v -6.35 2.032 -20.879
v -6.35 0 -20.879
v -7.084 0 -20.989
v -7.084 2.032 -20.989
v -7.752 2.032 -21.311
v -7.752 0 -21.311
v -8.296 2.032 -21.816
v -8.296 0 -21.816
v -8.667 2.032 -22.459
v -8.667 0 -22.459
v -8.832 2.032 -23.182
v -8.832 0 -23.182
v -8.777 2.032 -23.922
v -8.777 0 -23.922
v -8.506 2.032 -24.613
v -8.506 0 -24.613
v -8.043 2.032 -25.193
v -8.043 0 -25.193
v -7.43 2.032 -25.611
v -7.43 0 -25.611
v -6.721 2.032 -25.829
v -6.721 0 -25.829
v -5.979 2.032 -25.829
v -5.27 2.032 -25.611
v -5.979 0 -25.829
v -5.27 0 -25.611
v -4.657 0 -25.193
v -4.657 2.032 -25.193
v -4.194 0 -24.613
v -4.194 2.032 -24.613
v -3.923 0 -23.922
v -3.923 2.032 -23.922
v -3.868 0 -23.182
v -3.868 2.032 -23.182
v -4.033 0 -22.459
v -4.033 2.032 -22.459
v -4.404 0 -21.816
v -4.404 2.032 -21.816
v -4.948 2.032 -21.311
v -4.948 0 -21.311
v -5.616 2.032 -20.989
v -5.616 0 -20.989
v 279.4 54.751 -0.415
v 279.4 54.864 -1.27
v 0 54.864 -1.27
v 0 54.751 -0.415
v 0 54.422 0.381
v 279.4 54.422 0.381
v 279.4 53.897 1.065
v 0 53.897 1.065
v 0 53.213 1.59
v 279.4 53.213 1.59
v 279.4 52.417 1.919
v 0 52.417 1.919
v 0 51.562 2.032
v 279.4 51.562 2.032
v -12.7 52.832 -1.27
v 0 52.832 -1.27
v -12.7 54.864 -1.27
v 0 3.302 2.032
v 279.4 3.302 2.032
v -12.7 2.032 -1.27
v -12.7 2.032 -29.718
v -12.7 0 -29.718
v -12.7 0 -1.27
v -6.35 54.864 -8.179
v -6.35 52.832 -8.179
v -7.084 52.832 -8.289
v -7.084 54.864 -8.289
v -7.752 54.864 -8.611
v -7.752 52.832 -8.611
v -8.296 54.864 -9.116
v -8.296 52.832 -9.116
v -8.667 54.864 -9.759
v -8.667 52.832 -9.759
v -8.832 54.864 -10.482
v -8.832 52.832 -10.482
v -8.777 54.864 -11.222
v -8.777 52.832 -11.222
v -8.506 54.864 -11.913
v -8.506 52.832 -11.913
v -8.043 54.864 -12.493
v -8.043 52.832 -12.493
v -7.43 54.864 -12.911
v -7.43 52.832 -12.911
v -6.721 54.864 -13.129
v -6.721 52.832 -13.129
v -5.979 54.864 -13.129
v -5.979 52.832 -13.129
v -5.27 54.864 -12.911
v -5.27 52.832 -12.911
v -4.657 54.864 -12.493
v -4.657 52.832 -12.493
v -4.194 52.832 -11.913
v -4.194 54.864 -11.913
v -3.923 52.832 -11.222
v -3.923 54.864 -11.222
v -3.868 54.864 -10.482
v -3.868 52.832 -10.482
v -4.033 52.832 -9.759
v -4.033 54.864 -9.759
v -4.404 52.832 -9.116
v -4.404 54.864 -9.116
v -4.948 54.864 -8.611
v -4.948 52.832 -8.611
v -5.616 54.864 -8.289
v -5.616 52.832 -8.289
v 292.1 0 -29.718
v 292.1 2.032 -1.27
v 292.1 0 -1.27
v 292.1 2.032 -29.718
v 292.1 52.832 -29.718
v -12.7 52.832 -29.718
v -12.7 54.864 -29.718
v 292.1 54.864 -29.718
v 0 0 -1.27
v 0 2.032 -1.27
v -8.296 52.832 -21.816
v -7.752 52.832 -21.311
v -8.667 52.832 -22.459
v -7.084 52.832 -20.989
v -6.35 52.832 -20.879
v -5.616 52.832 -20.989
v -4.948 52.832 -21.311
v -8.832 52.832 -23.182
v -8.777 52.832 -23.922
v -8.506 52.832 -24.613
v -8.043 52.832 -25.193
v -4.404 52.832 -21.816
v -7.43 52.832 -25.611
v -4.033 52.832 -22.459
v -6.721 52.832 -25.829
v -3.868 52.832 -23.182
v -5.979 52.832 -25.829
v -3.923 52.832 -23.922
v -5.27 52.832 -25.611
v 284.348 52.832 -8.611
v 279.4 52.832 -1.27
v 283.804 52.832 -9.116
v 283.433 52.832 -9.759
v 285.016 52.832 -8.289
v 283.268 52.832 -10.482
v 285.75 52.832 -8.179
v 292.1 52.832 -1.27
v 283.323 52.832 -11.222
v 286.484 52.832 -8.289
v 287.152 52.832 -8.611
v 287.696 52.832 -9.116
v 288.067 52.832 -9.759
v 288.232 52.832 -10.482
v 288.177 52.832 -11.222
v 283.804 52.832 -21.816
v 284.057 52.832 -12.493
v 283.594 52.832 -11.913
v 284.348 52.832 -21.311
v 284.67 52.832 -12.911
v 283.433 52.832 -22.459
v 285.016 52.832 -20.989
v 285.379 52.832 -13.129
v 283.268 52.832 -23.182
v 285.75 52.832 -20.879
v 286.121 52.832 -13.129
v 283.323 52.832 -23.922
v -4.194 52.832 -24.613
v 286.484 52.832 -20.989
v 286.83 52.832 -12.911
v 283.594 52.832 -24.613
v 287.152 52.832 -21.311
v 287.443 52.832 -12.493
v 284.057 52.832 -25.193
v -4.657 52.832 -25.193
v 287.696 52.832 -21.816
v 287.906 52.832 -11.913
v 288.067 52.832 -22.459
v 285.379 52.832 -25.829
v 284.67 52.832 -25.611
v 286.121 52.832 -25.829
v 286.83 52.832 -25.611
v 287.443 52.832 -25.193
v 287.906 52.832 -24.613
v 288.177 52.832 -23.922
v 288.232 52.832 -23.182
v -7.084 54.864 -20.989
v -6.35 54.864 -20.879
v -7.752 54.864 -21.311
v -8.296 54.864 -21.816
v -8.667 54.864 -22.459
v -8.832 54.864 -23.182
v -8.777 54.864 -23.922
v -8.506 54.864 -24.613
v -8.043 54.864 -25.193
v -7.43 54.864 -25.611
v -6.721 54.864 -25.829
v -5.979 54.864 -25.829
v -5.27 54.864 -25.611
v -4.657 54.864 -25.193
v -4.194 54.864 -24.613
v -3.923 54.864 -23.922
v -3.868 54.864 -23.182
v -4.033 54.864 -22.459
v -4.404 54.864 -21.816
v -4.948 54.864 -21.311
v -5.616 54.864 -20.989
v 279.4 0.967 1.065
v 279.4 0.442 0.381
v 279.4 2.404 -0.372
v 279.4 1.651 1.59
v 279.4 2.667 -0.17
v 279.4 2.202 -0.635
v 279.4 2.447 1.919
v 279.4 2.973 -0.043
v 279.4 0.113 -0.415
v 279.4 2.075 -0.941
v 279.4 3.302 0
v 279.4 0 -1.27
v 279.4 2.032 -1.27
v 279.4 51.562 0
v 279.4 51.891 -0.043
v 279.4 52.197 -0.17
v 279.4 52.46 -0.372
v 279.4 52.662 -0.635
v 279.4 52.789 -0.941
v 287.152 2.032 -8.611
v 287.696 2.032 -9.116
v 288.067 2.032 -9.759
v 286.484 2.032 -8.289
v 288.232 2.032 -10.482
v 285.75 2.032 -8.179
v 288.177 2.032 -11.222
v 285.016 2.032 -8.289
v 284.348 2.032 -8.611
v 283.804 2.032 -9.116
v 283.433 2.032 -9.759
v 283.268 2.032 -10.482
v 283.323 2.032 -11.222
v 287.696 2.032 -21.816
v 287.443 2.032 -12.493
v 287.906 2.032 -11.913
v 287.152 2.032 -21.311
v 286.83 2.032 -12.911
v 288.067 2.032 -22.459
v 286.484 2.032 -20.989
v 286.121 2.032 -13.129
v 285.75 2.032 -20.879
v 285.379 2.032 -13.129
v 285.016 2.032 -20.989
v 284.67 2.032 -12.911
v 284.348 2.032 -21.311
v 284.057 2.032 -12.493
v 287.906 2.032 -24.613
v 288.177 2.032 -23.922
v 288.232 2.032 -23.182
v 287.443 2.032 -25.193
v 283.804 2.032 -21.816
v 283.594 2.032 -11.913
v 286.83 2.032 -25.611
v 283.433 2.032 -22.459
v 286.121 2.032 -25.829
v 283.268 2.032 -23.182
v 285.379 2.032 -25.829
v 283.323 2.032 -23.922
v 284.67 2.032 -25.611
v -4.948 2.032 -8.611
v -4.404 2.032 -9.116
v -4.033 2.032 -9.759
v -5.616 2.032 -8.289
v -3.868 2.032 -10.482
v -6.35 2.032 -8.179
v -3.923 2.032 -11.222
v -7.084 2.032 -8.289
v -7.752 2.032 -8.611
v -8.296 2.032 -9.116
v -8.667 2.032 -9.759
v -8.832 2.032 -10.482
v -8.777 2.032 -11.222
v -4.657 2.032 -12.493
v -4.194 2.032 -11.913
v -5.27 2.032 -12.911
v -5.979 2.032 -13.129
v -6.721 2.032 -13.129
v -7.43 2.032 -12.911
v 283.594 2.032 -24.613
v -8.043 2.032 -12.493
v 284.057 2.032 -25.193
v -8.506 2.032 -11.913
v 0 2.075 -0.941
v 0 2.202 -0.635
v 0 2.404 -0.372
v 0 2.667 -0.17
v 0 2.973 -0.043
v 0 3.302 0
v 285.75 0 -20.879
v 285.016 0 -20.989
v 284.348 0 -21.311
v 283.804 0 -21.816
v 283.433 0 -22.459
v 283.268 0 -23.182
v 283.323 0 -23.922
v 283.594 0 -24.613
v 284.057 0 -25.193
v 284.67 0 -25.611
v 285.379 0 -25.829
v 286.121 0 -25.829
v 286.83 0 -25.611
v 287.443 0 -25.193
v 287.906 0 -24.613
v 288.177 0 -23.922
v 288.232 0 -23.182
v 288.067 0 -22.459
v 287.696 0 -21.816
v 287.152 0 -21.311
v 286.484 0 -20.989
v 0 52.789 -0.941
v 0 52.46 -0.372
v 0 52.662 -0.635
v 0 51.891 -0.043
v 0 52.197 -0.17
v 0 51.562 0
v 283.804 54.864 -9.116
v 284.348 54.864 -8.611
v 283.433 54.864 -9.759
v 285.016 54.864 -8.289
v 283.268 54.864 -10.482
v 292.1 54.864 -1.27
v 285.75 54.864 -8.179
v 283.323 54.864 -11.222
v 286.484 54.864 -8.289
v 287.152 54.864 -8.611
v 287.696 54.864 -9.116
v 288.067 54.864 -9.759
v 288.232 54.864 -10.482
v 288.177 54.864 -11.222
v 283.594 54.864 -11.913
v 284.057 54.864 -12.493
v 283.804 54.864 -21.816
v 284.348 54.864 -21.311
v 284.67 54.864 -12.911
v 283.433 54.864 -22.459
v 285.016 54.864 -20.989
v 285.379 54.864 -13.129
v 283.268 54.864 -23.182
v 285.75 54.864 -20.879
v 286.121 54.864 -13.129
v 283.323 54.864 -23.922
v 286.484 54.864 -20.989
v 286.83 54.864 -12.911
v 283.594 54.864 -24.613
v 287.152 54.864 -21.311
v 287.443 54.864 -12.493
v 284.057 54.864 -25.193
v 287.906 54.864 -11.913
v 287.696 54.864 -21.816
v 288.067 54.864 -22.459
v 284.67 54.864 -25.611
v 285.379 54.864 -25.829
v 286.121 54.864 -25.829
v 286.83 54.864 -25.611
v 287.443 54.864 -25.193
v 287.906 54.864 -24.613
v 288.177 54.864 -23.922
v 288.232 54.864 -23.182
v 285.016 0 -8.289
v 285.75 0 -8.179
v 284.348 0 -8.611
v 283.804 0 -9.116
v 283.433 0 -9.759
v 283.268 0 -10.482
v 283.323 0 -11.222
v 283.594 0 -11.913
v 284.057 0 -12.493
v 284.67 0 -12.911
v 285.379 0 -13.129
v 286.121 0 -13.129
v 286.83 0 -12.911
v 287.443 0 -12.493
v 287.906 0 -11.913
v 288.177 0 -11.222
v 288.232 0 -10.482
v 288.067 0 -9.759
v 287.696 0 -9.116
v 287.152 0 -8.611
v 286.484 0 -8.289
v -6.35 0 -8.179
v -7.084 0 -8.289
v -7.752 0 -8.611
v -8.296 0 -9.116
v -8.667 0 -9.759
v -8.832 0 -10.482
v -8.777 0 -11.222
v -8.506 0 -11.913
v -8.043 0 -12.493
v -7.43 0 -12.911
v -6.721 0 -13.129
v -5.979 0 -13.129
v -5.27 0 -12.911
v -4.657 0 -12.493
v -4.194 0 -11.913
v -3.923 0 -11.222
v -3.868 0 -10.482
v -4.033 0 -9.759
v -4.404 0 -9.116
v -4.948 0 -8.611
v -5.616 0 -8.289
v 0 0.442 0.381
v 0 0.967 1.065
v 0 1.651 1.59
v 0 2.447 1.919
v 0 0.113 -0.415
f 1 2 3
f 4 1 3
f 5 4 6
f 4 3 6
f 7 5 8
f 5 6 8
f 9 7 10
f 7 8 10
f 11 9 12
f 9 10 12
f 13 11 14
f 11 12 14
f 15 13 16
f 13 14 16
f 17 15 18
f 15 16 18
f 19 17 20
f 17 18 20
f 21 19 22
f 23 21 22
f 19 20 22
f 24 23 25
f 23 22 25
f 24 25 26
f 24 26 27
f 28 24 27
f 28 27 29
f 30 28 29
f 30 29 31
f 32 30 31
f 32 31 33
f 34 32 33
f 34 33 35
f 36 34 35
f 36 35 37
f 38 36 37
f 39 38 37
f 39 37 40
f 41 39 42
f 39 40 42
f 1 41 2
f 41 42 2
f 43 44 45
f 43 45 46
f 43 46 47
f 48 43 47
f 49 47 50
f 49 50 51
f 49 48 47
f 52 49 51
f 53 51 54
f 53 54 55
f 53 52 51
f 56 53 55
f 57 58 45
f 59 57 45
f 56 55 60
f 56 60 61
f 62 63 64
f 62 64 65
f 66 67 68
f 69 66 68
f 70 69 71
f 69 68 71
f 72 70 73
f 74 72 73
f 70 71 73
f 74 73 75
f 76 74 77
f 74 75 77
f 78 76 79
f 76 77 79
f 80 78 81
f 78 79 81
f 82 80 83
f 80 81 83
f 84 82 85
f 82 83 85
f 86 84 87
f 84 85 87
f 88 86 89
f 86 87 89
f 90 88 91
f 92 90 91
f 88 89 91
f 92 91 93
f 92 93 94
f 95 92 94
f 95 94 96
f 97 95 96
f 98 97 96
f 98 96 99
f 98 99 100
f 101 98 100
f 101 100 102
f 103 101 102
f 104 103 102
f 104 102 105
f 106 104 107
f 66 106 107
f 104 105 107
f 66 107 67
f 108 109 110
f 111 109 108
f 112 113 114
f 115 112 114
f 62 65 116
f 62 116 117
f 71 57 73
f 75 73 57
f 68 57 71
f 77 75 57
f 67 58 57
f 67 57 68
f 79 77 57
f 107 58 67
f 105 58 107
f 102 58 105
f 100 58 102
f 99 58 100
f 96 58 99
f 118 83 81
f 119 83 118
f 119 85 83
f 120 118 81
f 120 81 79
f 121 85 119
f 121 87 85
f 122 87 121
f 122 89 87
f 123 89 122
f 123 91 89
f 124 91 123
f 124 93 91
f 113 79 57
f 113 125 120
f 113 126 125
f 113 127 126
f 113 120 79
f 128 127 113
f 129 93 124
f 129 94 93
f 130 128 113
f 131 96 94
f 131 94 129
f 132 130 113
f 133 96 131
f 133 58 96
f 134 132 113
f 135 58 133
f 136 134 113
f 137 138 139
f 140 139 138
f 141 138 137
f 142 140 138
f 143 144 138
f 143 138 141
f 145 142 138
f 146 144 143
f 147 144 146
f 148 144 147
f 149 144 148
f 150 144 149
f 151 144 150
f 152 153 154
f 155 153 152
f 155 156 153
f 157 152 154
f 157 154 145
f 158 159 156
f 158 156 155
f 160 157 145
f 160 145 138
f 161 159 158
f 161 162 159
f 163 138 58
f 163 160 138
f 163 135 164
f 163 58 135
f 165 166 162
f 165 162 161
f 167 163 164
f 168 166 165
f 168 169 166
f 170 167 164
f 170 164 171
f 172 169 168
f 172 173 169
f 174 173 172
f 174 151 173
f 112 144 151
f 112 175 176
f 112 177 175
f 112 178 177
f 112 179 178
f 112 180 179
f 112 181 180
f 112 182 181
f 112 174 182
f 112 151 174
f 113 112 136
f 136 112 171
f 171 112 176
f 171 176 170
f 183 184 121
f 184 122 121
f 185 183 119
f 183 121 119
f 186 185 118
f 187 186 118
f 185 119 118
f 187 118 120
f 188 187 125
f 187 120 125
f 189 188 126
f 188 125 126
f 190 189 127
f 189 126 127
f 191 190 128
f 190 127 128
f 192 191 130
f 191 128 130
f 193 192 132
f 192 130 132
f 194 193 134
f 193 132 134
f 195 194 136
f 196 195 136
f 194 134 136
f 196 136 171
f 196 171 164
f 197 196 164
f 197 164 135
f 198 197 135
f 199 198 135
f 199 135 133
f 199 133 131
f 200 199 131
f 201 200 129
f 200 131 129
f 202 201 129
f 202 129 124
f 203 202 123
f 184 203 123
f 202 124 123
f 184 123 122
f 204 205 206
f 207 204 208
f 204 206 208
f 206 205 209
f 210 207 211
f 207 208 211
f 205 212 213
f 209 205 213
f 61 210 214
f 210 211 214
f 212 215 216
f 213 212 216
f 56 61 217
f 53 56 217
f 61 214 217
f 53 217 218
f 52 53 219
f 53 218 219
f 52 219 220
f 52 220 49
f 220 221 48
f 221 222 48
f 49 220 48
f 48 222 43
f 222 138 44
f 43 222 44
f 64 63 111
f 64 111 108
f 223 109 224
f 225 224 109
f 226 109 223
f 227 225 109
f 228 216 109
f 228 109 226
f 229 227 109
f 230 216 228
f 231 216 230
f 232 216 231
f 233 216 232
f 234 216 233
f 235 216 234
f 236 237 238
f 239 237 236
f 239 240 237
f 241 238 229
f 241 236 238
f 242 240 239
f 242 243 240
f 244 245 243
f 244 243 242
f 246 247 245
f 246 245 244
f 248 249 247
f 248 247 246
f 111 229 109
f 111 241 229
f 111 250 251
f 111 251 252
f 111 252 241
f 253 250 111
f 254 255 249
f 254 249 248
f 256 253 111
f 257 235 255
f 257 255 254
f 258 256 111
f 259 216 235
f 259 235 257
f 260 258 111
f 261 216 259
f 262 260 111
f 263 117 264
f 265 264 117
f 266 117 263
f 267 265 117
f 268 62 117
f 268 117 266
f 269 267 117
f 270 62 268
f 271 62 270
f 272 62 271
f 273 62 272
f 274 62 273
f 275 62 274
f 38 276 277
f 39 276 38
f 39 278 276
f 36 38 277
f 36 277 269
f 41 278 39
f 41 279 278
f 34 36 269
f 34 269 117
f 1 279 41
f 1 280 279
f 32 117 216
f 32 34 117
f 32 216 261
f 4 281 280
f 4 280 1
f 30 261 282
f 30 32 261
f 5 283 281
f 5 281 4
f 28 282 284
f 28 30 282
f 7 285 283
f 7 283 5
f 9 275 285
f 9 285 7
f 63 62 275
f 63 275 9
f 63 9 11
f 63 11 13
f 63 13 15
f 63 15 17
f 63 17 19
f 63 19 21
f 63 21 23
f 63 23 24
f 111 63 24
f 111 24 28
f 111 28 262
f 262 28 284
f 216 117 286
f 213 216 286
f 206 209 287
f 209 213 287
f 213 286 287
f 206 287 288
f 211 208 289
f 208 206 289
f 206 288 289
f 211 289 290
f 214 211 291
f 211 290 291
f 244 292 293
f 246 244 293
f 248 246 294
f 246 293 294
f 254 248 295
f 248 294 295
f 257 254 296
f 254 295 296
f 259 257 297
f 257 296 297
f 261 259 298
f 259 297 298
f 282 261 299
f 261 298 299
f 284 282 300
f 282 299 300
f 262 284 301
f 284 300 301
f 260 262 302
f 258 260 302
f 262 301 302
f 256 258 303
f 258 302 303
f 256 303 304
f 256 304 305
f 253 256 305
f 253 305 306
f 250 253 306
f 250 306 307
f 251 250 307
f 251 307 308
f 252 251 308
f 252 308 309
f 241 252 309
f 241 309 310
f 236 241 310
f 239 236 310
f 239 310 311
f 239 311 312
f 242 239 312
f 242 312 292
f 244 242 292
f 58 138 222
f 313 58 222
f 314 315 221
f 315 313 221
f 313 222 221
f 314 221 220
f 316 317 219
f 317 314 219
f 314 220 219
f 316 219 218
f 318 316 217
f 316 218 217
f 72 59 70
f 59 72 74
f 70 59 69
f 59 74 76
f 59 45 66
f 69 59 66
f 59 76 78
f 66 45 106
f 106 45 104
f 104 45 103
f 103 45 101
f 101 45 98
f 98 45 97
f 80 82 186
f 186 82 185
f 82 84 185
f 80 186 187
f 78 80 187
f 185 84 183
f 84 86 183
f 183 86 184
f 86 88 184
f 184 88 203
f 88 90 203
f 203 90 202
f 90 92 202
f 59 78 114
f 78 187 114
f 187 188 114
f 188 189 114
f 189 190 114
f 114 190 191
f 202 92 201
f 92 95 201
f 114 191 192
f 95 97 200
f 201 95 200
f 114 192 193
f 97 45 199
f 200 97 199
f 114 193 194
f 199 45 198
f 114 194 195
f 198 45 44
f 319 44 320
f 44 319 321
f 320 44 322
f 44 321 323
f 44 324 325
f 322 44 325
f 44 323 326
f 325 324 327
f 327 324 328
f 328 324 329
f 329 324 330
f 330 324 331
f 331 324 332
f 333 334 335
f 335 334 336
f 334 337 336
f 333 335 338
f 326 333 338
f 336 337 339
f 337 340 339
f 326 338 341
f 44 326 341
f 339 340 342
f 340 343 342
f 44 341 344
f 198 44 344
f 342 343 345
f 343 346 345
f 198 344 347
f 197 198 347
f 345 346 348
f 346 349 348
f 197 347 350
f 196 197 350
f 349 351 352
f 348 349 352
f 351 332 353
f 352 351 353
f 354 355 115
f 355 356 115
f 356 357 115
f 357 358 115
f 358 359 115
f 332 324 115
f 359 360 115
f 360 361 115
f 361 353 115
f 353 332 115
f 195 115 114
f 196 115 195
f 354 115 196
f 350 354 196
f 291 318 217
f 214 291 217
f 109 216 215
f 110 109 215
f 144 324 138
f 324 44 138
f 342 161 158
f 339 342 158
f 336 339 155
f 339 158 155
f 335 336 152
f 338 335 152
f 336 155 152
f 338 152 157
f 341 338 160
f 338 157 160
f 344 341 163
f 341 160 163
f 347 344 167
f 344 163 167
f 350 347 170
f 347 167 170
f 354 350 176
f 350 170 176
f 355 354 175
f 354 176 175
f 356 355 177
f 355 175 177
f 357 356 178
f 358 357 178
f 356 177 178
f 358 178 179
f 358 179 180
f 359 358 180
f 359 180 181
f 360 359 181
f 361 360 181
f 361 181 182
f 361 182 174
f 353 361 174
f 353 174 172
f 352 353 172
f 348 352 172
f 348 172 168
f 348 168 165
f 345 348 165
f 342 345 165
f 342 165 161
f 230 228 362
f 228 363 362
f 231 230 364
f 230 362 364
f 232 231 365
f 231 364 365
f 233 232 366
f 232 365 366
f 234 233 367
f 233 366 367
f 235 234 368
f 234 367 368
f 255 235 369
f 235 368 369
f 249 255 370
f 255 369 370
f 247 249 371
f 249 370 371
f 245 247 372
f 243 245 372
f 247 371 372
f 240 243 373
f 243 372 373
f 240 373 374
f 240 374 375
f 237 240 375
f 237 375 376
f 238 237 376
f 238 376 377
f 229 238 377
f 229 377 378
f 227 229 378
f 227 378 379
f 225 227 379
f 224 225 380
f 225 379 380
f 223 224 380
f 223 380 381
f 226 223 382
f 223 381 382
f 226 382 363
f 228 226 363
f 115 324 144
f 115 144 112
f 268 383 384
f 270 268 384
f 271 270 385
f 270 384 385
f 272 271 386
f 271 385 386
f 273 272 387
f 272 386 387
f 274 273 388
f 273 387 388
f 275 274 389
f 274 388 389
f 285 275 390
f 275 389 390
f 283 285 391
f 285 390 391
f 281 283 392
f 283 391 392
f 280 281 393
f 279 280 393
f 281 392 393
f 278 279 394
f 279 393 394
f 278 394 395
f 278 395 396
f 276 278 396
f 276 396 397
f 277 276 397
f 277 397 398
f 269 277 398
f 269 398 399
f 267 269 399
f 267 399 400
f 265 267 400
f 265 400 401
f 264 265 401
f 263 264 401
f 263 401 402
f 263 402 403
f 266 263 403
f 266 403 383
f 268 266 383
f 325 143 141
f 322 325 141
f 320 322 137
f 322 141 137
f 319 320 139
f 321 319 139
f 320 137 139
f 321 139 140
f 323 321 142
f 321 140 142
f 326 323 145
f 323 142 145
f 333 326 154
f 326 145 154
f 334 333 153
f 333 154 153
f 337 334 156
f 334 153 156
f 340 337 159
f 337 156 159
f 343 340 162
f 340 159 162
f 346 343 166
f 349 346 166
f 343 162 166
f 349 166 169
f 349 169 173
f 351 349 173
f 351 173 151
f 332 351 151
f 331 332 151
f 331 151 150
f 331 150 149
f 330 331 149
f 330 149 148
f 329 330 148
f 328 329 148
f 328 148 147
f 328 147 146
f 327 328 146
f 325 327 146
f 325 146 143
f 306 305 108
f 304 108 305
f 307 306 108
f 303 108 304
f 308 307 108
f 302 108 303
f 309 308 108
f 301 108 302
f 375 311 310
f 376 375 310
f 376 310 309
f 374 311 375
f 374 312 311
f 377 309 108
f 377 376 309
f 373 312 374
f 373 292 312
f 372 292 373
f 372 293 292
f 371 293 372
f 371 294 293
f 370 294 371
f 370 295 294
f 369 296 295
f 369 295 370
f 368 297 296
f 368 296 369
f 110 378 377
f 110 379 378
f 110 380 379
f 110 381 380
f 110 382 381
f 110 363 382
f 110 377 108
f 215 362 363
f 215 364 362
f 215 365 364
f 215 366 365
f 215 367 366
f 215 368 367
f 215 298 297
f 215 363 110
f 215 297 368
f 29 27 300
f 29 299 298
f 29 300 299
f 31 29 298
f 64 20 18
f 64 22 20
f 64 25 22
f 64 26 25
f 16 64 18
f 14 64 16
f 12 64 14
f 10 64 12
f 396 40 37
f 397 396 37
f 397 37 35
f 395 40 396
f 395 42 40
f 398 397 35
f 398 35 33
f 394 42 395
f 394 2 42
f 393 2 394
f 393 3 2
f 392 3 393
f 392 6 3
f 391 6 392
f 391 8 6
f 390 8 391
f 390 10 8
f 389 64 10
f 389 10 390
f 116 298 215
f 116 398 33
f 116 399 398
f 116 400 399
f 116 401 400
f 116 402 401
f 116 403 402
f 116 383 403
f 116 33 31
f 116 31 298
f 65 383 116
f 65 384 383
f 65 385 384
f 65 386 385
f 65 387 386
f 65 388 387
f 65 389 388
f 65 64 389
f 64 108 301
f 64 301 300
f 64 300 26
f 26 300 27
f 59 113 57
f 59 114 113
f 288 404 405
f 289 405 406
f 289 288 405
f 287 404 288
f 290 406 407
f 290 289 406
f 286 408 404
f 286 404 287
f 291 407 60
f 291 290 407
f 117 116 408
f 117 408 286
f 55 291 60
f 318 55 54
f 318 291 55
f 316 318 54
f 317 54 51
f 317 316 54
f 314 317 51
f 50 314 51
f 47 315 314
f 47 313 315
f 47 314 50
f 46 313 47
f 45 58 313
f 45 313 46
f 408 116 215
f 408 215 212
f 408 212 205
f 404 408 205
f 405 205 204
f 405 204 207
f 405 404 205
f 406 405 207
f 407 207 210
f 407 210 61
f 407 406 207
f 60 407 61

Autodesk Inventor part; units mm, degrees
ref_plane "YZ Plane" through (0, 0, 0) normal (1, 0, 0) x (0, 1, 0)
ref_plane "XZ Plane" through (0, 0, 0) normal (0, 1, 0) x (-1, 0, 0)
ref_plane "XY Plane" through (0, 0, 0) normal (0, 0, 1) x (1, 0, 0)
sketch "Sketch1" plane through (0, 0, 0) normal (0, 0, 1) x (1, 0, 0)
  line L0 (0, 0) -> (279.4, 0)
  line L1 (279.4, 0) -> (279.4, 54.864)
  line L2 (279.4, 54.864) -> (0, 54.864)
  line L3 (0, 54.864) -> (0, 0)
  dimension "d0" = 54.864
  dimension "d1" = 279.4
extrude "Plate1" add sketch "Sketch1" along normal blind 2.032
sketch "Sketch2" plane through (279.4, 52.832, 2.032) normal (0, 1, 0) x (-1, 0, 0)
  line L0 (279.4, 0) -> (0, 0)
  line L1 (0, 0) -> (0, -31.75)
  line L2 (0, -31.75) -> (279.4, -31.75)
  line L3 (279.4, -31.75) -> (279.4, 0)
edge flange "Flange1" height 31.75 angle 90 thickness 2.032 bend radius 1.27 thickness toward (0, 1, 0) relief tear relief width 2.032 relief depth 1.016 edges at (139.7, 54.864, 0) wall of the first edge with corners at (0, 52.832, 2.032) (279.4, 52.832, 2.032) (279.4, 52.832, -29.718) (0, 52.832, -29.718)
bend "Bend1"
corner "Corner1"
sketch "Sketch3" plane through (0, 2.032, 2.032) normal (0, -1, 0) x (1, 0, 0)
  line L0 (279.4, 0) -> (0, 0)
  line L1 (0, 0) -> (0, -31.75)
  line L2 (0, -31.75) -> (279.4, -31.75)
  line L3 (279.4, -31.75) -> (279.4, 0)
edge flange "Flange2" height 31.75 angle 90 thickness 2.032 bend radius 1.27 thickness toward (0, -1, 0) relief tear relief width 2.032 relief depth 1.016 edges at (139.7, 0, 0) wall of the first edge with corners at (279.4, 2.032, 2.032) (0, 2.032, 2.032) (0, 2.032, -29.718) (279.4, 2.032, -29.718)
bend "Bend2"
corner "Corner2"
sketch "Sketch4" plane through (279.4, 52.832, -29.718) normal (1, 0, 0) x (0, 0, -1)
  line L0 (-28.448, 2.032) -> (-28.448, 0) projected
  line L1 (-28.448, 0) -> (0, 0) projected
  line L2 (0, 0) -> (0, 2.032) projected
  line L3 (0, 2.032) -> (-28.448, 2.032) projected
  arc A0 (-28.448, 2.032) -> (-31.75, -1.27) centre (-28.448, -1.27) ccw projected
  line L4 (-29.718, -1.27) -> (-31.75, -1.27) projected
  arc A1 (-28.448, 0) -> (-29.718, -1.27) centre (-28.448, -1.27) ccw projected
  line L5 (-28.448, -50.8) -> (-28.448, -52.832) projected
  line L6 (-28.448, -52.832) -> (0, -52.832) projected
  line L7 (0, -50.8) -> (0, -52.832) projected
  line L8 (-28.448, -50.8) -> (0, -50.8) projected
  arc A2 (-29.718, -49.53) -> (-28.448, -50.8) centre (-28.448, -49.53) ccw projected
  line L9 (-31.75, -49.53) -> (-29.718, -49.53) projected
  arc A3 (-31.75, -49.53) -> (-28.448, -52.832) centre (-28.448, -49.53) ccw projected
  point P0 (-29.718, -52.832)
extrude "Extrusion1" add sketch "Sketch4" along normal blind 12.7 contours L3 L2 L1 L0 | L8 L7 L6 L5
sketch "Sketch5" plane through (0, 52.832, -29.718) normal (-1, 0, 0) x (0, 0, 1)
  line L0 (28.448, 0) -> (28.448, 2.032) projected
  line L1 (28.448, 2.032) -> (0, 2.032) projected
  line L2 (0, 0) -> (0, 2.032) projected
  line L3 (28.448, 0) -> (0, 0) projected
  arc A0 (29.718, -1.27) -> (28.448, 0) centre (28.448, -1.27) ccw projected
  line L4 (31.75, -1.27) -> (29.718, -1.27) projected
  arc A1 (31.75, -1.27) -> (28.448, 2.032) centre (28.448, -1.27) ccw projected
  line L5 (28.448, -52.832) -> (28.448, -50.8) projected
  line L6 (28.448, -50.8) -> (0, -50.8) projected
  line L7 (0, -50.8) -> (0, -52.832) projected
  line L8 (0, -52.832) -> (28.448, -52.832) projected
  arc A2 (28.448, -52.832) -> (31.75, -49.53) centre (28.448, -49.53) ccw projected
  line L9 (29.718, -49.53) -> (31.75, -49.53) projected
  arc A3 (28.448, -50.8) -> (29.718, -49.53) centre (28.448, -49.53) ccw projected
  point P0 (29.718, -52.832)
extrude "Extrusion2" add sketch "Sketch5" along normal blind 12.7 contours L3 L2 L1 L0 | L8 L7 L6 L5
sketch "Sketch6" plane through (279.4, 54.864, -1.27) normal (0, 1, 0) x (1, 0, 0)
  line L0 (0, -3.302) -> (-279.4, -3.302) projected
  line L1 (12.7, 28.448) -> (12.7, 0) projected
  line L2 (-292.1, 0) -> (-292.1, 28.448) projected
  point P0 (-279.4, -1.27)
  point P1 (6.35, 9.398)
  point P2 (6.35, 22.098)
  point P3 (-285.75, 9.398)
  point P4 (-285.75, 22.098)
  dimension "d27" = 12.7
  dimension "d28" = 12.7
  dimension "d29" = 6.35
  dimension "d30" = 6.35
hole "Hole1" at (285.75, 54.864, -10.668) at (285.75, 54.864, -23.368) at (-6.35, 54.864, -10.668) at (-6.35, 54.864, -23.368) direction (0, -1, 0) diameter 4.9784 end through all
equation "\"d36\" = Thickness"
equation "\"d2\" = Thickness"
equation "\"d3\" = BendReliefWidth"
equation "\"d4\" = BendReliefDepth"
equation "\"d5\" = MinimumRemnant"
equation "\"d6\" = TransitionRadius"
equation "\"d9\" = BendRadius"
equation "\"d10\" = CornerReliefSize"
equation "\"d11\" = GapSize"
equation "\"d12\" = JacobiRadiusSize"
equation "\"d13\" = BendReliefWidth"
equation "\"d14\" = BendReliefDepth"
equation "\"d15\" = MinimumRemnant"
equation "\"d16\" = TransitionRadius"
equation "\"d19\" = BendRadius"
equation "\"d20\" = CornerReliefSize"
equation "\"d21\" = GapSize"
equation "\"d22\" = JacobiRadiusSize"
equation "\"BendReliefWidth\" = Thickness"
equation "\"BendReliefDepth\" = 0.5 * Thickness"
equation "\"CornerReliefSize\" = 4 * Thickness"
equation "\"MinimumRemnant\" = 2 * Thickness"
equation "\"TransitionRadius\" = BendRadius"
equation "\"JacobiRadiusSize\" = BendRadius"
equation "\"GapSize\" = Thickness"
equation "\"Thickness\" = 2.032"
equation "\"BendRadius\" = 1.27"
properties part number "Back brace" material "Aluminum 6061"
